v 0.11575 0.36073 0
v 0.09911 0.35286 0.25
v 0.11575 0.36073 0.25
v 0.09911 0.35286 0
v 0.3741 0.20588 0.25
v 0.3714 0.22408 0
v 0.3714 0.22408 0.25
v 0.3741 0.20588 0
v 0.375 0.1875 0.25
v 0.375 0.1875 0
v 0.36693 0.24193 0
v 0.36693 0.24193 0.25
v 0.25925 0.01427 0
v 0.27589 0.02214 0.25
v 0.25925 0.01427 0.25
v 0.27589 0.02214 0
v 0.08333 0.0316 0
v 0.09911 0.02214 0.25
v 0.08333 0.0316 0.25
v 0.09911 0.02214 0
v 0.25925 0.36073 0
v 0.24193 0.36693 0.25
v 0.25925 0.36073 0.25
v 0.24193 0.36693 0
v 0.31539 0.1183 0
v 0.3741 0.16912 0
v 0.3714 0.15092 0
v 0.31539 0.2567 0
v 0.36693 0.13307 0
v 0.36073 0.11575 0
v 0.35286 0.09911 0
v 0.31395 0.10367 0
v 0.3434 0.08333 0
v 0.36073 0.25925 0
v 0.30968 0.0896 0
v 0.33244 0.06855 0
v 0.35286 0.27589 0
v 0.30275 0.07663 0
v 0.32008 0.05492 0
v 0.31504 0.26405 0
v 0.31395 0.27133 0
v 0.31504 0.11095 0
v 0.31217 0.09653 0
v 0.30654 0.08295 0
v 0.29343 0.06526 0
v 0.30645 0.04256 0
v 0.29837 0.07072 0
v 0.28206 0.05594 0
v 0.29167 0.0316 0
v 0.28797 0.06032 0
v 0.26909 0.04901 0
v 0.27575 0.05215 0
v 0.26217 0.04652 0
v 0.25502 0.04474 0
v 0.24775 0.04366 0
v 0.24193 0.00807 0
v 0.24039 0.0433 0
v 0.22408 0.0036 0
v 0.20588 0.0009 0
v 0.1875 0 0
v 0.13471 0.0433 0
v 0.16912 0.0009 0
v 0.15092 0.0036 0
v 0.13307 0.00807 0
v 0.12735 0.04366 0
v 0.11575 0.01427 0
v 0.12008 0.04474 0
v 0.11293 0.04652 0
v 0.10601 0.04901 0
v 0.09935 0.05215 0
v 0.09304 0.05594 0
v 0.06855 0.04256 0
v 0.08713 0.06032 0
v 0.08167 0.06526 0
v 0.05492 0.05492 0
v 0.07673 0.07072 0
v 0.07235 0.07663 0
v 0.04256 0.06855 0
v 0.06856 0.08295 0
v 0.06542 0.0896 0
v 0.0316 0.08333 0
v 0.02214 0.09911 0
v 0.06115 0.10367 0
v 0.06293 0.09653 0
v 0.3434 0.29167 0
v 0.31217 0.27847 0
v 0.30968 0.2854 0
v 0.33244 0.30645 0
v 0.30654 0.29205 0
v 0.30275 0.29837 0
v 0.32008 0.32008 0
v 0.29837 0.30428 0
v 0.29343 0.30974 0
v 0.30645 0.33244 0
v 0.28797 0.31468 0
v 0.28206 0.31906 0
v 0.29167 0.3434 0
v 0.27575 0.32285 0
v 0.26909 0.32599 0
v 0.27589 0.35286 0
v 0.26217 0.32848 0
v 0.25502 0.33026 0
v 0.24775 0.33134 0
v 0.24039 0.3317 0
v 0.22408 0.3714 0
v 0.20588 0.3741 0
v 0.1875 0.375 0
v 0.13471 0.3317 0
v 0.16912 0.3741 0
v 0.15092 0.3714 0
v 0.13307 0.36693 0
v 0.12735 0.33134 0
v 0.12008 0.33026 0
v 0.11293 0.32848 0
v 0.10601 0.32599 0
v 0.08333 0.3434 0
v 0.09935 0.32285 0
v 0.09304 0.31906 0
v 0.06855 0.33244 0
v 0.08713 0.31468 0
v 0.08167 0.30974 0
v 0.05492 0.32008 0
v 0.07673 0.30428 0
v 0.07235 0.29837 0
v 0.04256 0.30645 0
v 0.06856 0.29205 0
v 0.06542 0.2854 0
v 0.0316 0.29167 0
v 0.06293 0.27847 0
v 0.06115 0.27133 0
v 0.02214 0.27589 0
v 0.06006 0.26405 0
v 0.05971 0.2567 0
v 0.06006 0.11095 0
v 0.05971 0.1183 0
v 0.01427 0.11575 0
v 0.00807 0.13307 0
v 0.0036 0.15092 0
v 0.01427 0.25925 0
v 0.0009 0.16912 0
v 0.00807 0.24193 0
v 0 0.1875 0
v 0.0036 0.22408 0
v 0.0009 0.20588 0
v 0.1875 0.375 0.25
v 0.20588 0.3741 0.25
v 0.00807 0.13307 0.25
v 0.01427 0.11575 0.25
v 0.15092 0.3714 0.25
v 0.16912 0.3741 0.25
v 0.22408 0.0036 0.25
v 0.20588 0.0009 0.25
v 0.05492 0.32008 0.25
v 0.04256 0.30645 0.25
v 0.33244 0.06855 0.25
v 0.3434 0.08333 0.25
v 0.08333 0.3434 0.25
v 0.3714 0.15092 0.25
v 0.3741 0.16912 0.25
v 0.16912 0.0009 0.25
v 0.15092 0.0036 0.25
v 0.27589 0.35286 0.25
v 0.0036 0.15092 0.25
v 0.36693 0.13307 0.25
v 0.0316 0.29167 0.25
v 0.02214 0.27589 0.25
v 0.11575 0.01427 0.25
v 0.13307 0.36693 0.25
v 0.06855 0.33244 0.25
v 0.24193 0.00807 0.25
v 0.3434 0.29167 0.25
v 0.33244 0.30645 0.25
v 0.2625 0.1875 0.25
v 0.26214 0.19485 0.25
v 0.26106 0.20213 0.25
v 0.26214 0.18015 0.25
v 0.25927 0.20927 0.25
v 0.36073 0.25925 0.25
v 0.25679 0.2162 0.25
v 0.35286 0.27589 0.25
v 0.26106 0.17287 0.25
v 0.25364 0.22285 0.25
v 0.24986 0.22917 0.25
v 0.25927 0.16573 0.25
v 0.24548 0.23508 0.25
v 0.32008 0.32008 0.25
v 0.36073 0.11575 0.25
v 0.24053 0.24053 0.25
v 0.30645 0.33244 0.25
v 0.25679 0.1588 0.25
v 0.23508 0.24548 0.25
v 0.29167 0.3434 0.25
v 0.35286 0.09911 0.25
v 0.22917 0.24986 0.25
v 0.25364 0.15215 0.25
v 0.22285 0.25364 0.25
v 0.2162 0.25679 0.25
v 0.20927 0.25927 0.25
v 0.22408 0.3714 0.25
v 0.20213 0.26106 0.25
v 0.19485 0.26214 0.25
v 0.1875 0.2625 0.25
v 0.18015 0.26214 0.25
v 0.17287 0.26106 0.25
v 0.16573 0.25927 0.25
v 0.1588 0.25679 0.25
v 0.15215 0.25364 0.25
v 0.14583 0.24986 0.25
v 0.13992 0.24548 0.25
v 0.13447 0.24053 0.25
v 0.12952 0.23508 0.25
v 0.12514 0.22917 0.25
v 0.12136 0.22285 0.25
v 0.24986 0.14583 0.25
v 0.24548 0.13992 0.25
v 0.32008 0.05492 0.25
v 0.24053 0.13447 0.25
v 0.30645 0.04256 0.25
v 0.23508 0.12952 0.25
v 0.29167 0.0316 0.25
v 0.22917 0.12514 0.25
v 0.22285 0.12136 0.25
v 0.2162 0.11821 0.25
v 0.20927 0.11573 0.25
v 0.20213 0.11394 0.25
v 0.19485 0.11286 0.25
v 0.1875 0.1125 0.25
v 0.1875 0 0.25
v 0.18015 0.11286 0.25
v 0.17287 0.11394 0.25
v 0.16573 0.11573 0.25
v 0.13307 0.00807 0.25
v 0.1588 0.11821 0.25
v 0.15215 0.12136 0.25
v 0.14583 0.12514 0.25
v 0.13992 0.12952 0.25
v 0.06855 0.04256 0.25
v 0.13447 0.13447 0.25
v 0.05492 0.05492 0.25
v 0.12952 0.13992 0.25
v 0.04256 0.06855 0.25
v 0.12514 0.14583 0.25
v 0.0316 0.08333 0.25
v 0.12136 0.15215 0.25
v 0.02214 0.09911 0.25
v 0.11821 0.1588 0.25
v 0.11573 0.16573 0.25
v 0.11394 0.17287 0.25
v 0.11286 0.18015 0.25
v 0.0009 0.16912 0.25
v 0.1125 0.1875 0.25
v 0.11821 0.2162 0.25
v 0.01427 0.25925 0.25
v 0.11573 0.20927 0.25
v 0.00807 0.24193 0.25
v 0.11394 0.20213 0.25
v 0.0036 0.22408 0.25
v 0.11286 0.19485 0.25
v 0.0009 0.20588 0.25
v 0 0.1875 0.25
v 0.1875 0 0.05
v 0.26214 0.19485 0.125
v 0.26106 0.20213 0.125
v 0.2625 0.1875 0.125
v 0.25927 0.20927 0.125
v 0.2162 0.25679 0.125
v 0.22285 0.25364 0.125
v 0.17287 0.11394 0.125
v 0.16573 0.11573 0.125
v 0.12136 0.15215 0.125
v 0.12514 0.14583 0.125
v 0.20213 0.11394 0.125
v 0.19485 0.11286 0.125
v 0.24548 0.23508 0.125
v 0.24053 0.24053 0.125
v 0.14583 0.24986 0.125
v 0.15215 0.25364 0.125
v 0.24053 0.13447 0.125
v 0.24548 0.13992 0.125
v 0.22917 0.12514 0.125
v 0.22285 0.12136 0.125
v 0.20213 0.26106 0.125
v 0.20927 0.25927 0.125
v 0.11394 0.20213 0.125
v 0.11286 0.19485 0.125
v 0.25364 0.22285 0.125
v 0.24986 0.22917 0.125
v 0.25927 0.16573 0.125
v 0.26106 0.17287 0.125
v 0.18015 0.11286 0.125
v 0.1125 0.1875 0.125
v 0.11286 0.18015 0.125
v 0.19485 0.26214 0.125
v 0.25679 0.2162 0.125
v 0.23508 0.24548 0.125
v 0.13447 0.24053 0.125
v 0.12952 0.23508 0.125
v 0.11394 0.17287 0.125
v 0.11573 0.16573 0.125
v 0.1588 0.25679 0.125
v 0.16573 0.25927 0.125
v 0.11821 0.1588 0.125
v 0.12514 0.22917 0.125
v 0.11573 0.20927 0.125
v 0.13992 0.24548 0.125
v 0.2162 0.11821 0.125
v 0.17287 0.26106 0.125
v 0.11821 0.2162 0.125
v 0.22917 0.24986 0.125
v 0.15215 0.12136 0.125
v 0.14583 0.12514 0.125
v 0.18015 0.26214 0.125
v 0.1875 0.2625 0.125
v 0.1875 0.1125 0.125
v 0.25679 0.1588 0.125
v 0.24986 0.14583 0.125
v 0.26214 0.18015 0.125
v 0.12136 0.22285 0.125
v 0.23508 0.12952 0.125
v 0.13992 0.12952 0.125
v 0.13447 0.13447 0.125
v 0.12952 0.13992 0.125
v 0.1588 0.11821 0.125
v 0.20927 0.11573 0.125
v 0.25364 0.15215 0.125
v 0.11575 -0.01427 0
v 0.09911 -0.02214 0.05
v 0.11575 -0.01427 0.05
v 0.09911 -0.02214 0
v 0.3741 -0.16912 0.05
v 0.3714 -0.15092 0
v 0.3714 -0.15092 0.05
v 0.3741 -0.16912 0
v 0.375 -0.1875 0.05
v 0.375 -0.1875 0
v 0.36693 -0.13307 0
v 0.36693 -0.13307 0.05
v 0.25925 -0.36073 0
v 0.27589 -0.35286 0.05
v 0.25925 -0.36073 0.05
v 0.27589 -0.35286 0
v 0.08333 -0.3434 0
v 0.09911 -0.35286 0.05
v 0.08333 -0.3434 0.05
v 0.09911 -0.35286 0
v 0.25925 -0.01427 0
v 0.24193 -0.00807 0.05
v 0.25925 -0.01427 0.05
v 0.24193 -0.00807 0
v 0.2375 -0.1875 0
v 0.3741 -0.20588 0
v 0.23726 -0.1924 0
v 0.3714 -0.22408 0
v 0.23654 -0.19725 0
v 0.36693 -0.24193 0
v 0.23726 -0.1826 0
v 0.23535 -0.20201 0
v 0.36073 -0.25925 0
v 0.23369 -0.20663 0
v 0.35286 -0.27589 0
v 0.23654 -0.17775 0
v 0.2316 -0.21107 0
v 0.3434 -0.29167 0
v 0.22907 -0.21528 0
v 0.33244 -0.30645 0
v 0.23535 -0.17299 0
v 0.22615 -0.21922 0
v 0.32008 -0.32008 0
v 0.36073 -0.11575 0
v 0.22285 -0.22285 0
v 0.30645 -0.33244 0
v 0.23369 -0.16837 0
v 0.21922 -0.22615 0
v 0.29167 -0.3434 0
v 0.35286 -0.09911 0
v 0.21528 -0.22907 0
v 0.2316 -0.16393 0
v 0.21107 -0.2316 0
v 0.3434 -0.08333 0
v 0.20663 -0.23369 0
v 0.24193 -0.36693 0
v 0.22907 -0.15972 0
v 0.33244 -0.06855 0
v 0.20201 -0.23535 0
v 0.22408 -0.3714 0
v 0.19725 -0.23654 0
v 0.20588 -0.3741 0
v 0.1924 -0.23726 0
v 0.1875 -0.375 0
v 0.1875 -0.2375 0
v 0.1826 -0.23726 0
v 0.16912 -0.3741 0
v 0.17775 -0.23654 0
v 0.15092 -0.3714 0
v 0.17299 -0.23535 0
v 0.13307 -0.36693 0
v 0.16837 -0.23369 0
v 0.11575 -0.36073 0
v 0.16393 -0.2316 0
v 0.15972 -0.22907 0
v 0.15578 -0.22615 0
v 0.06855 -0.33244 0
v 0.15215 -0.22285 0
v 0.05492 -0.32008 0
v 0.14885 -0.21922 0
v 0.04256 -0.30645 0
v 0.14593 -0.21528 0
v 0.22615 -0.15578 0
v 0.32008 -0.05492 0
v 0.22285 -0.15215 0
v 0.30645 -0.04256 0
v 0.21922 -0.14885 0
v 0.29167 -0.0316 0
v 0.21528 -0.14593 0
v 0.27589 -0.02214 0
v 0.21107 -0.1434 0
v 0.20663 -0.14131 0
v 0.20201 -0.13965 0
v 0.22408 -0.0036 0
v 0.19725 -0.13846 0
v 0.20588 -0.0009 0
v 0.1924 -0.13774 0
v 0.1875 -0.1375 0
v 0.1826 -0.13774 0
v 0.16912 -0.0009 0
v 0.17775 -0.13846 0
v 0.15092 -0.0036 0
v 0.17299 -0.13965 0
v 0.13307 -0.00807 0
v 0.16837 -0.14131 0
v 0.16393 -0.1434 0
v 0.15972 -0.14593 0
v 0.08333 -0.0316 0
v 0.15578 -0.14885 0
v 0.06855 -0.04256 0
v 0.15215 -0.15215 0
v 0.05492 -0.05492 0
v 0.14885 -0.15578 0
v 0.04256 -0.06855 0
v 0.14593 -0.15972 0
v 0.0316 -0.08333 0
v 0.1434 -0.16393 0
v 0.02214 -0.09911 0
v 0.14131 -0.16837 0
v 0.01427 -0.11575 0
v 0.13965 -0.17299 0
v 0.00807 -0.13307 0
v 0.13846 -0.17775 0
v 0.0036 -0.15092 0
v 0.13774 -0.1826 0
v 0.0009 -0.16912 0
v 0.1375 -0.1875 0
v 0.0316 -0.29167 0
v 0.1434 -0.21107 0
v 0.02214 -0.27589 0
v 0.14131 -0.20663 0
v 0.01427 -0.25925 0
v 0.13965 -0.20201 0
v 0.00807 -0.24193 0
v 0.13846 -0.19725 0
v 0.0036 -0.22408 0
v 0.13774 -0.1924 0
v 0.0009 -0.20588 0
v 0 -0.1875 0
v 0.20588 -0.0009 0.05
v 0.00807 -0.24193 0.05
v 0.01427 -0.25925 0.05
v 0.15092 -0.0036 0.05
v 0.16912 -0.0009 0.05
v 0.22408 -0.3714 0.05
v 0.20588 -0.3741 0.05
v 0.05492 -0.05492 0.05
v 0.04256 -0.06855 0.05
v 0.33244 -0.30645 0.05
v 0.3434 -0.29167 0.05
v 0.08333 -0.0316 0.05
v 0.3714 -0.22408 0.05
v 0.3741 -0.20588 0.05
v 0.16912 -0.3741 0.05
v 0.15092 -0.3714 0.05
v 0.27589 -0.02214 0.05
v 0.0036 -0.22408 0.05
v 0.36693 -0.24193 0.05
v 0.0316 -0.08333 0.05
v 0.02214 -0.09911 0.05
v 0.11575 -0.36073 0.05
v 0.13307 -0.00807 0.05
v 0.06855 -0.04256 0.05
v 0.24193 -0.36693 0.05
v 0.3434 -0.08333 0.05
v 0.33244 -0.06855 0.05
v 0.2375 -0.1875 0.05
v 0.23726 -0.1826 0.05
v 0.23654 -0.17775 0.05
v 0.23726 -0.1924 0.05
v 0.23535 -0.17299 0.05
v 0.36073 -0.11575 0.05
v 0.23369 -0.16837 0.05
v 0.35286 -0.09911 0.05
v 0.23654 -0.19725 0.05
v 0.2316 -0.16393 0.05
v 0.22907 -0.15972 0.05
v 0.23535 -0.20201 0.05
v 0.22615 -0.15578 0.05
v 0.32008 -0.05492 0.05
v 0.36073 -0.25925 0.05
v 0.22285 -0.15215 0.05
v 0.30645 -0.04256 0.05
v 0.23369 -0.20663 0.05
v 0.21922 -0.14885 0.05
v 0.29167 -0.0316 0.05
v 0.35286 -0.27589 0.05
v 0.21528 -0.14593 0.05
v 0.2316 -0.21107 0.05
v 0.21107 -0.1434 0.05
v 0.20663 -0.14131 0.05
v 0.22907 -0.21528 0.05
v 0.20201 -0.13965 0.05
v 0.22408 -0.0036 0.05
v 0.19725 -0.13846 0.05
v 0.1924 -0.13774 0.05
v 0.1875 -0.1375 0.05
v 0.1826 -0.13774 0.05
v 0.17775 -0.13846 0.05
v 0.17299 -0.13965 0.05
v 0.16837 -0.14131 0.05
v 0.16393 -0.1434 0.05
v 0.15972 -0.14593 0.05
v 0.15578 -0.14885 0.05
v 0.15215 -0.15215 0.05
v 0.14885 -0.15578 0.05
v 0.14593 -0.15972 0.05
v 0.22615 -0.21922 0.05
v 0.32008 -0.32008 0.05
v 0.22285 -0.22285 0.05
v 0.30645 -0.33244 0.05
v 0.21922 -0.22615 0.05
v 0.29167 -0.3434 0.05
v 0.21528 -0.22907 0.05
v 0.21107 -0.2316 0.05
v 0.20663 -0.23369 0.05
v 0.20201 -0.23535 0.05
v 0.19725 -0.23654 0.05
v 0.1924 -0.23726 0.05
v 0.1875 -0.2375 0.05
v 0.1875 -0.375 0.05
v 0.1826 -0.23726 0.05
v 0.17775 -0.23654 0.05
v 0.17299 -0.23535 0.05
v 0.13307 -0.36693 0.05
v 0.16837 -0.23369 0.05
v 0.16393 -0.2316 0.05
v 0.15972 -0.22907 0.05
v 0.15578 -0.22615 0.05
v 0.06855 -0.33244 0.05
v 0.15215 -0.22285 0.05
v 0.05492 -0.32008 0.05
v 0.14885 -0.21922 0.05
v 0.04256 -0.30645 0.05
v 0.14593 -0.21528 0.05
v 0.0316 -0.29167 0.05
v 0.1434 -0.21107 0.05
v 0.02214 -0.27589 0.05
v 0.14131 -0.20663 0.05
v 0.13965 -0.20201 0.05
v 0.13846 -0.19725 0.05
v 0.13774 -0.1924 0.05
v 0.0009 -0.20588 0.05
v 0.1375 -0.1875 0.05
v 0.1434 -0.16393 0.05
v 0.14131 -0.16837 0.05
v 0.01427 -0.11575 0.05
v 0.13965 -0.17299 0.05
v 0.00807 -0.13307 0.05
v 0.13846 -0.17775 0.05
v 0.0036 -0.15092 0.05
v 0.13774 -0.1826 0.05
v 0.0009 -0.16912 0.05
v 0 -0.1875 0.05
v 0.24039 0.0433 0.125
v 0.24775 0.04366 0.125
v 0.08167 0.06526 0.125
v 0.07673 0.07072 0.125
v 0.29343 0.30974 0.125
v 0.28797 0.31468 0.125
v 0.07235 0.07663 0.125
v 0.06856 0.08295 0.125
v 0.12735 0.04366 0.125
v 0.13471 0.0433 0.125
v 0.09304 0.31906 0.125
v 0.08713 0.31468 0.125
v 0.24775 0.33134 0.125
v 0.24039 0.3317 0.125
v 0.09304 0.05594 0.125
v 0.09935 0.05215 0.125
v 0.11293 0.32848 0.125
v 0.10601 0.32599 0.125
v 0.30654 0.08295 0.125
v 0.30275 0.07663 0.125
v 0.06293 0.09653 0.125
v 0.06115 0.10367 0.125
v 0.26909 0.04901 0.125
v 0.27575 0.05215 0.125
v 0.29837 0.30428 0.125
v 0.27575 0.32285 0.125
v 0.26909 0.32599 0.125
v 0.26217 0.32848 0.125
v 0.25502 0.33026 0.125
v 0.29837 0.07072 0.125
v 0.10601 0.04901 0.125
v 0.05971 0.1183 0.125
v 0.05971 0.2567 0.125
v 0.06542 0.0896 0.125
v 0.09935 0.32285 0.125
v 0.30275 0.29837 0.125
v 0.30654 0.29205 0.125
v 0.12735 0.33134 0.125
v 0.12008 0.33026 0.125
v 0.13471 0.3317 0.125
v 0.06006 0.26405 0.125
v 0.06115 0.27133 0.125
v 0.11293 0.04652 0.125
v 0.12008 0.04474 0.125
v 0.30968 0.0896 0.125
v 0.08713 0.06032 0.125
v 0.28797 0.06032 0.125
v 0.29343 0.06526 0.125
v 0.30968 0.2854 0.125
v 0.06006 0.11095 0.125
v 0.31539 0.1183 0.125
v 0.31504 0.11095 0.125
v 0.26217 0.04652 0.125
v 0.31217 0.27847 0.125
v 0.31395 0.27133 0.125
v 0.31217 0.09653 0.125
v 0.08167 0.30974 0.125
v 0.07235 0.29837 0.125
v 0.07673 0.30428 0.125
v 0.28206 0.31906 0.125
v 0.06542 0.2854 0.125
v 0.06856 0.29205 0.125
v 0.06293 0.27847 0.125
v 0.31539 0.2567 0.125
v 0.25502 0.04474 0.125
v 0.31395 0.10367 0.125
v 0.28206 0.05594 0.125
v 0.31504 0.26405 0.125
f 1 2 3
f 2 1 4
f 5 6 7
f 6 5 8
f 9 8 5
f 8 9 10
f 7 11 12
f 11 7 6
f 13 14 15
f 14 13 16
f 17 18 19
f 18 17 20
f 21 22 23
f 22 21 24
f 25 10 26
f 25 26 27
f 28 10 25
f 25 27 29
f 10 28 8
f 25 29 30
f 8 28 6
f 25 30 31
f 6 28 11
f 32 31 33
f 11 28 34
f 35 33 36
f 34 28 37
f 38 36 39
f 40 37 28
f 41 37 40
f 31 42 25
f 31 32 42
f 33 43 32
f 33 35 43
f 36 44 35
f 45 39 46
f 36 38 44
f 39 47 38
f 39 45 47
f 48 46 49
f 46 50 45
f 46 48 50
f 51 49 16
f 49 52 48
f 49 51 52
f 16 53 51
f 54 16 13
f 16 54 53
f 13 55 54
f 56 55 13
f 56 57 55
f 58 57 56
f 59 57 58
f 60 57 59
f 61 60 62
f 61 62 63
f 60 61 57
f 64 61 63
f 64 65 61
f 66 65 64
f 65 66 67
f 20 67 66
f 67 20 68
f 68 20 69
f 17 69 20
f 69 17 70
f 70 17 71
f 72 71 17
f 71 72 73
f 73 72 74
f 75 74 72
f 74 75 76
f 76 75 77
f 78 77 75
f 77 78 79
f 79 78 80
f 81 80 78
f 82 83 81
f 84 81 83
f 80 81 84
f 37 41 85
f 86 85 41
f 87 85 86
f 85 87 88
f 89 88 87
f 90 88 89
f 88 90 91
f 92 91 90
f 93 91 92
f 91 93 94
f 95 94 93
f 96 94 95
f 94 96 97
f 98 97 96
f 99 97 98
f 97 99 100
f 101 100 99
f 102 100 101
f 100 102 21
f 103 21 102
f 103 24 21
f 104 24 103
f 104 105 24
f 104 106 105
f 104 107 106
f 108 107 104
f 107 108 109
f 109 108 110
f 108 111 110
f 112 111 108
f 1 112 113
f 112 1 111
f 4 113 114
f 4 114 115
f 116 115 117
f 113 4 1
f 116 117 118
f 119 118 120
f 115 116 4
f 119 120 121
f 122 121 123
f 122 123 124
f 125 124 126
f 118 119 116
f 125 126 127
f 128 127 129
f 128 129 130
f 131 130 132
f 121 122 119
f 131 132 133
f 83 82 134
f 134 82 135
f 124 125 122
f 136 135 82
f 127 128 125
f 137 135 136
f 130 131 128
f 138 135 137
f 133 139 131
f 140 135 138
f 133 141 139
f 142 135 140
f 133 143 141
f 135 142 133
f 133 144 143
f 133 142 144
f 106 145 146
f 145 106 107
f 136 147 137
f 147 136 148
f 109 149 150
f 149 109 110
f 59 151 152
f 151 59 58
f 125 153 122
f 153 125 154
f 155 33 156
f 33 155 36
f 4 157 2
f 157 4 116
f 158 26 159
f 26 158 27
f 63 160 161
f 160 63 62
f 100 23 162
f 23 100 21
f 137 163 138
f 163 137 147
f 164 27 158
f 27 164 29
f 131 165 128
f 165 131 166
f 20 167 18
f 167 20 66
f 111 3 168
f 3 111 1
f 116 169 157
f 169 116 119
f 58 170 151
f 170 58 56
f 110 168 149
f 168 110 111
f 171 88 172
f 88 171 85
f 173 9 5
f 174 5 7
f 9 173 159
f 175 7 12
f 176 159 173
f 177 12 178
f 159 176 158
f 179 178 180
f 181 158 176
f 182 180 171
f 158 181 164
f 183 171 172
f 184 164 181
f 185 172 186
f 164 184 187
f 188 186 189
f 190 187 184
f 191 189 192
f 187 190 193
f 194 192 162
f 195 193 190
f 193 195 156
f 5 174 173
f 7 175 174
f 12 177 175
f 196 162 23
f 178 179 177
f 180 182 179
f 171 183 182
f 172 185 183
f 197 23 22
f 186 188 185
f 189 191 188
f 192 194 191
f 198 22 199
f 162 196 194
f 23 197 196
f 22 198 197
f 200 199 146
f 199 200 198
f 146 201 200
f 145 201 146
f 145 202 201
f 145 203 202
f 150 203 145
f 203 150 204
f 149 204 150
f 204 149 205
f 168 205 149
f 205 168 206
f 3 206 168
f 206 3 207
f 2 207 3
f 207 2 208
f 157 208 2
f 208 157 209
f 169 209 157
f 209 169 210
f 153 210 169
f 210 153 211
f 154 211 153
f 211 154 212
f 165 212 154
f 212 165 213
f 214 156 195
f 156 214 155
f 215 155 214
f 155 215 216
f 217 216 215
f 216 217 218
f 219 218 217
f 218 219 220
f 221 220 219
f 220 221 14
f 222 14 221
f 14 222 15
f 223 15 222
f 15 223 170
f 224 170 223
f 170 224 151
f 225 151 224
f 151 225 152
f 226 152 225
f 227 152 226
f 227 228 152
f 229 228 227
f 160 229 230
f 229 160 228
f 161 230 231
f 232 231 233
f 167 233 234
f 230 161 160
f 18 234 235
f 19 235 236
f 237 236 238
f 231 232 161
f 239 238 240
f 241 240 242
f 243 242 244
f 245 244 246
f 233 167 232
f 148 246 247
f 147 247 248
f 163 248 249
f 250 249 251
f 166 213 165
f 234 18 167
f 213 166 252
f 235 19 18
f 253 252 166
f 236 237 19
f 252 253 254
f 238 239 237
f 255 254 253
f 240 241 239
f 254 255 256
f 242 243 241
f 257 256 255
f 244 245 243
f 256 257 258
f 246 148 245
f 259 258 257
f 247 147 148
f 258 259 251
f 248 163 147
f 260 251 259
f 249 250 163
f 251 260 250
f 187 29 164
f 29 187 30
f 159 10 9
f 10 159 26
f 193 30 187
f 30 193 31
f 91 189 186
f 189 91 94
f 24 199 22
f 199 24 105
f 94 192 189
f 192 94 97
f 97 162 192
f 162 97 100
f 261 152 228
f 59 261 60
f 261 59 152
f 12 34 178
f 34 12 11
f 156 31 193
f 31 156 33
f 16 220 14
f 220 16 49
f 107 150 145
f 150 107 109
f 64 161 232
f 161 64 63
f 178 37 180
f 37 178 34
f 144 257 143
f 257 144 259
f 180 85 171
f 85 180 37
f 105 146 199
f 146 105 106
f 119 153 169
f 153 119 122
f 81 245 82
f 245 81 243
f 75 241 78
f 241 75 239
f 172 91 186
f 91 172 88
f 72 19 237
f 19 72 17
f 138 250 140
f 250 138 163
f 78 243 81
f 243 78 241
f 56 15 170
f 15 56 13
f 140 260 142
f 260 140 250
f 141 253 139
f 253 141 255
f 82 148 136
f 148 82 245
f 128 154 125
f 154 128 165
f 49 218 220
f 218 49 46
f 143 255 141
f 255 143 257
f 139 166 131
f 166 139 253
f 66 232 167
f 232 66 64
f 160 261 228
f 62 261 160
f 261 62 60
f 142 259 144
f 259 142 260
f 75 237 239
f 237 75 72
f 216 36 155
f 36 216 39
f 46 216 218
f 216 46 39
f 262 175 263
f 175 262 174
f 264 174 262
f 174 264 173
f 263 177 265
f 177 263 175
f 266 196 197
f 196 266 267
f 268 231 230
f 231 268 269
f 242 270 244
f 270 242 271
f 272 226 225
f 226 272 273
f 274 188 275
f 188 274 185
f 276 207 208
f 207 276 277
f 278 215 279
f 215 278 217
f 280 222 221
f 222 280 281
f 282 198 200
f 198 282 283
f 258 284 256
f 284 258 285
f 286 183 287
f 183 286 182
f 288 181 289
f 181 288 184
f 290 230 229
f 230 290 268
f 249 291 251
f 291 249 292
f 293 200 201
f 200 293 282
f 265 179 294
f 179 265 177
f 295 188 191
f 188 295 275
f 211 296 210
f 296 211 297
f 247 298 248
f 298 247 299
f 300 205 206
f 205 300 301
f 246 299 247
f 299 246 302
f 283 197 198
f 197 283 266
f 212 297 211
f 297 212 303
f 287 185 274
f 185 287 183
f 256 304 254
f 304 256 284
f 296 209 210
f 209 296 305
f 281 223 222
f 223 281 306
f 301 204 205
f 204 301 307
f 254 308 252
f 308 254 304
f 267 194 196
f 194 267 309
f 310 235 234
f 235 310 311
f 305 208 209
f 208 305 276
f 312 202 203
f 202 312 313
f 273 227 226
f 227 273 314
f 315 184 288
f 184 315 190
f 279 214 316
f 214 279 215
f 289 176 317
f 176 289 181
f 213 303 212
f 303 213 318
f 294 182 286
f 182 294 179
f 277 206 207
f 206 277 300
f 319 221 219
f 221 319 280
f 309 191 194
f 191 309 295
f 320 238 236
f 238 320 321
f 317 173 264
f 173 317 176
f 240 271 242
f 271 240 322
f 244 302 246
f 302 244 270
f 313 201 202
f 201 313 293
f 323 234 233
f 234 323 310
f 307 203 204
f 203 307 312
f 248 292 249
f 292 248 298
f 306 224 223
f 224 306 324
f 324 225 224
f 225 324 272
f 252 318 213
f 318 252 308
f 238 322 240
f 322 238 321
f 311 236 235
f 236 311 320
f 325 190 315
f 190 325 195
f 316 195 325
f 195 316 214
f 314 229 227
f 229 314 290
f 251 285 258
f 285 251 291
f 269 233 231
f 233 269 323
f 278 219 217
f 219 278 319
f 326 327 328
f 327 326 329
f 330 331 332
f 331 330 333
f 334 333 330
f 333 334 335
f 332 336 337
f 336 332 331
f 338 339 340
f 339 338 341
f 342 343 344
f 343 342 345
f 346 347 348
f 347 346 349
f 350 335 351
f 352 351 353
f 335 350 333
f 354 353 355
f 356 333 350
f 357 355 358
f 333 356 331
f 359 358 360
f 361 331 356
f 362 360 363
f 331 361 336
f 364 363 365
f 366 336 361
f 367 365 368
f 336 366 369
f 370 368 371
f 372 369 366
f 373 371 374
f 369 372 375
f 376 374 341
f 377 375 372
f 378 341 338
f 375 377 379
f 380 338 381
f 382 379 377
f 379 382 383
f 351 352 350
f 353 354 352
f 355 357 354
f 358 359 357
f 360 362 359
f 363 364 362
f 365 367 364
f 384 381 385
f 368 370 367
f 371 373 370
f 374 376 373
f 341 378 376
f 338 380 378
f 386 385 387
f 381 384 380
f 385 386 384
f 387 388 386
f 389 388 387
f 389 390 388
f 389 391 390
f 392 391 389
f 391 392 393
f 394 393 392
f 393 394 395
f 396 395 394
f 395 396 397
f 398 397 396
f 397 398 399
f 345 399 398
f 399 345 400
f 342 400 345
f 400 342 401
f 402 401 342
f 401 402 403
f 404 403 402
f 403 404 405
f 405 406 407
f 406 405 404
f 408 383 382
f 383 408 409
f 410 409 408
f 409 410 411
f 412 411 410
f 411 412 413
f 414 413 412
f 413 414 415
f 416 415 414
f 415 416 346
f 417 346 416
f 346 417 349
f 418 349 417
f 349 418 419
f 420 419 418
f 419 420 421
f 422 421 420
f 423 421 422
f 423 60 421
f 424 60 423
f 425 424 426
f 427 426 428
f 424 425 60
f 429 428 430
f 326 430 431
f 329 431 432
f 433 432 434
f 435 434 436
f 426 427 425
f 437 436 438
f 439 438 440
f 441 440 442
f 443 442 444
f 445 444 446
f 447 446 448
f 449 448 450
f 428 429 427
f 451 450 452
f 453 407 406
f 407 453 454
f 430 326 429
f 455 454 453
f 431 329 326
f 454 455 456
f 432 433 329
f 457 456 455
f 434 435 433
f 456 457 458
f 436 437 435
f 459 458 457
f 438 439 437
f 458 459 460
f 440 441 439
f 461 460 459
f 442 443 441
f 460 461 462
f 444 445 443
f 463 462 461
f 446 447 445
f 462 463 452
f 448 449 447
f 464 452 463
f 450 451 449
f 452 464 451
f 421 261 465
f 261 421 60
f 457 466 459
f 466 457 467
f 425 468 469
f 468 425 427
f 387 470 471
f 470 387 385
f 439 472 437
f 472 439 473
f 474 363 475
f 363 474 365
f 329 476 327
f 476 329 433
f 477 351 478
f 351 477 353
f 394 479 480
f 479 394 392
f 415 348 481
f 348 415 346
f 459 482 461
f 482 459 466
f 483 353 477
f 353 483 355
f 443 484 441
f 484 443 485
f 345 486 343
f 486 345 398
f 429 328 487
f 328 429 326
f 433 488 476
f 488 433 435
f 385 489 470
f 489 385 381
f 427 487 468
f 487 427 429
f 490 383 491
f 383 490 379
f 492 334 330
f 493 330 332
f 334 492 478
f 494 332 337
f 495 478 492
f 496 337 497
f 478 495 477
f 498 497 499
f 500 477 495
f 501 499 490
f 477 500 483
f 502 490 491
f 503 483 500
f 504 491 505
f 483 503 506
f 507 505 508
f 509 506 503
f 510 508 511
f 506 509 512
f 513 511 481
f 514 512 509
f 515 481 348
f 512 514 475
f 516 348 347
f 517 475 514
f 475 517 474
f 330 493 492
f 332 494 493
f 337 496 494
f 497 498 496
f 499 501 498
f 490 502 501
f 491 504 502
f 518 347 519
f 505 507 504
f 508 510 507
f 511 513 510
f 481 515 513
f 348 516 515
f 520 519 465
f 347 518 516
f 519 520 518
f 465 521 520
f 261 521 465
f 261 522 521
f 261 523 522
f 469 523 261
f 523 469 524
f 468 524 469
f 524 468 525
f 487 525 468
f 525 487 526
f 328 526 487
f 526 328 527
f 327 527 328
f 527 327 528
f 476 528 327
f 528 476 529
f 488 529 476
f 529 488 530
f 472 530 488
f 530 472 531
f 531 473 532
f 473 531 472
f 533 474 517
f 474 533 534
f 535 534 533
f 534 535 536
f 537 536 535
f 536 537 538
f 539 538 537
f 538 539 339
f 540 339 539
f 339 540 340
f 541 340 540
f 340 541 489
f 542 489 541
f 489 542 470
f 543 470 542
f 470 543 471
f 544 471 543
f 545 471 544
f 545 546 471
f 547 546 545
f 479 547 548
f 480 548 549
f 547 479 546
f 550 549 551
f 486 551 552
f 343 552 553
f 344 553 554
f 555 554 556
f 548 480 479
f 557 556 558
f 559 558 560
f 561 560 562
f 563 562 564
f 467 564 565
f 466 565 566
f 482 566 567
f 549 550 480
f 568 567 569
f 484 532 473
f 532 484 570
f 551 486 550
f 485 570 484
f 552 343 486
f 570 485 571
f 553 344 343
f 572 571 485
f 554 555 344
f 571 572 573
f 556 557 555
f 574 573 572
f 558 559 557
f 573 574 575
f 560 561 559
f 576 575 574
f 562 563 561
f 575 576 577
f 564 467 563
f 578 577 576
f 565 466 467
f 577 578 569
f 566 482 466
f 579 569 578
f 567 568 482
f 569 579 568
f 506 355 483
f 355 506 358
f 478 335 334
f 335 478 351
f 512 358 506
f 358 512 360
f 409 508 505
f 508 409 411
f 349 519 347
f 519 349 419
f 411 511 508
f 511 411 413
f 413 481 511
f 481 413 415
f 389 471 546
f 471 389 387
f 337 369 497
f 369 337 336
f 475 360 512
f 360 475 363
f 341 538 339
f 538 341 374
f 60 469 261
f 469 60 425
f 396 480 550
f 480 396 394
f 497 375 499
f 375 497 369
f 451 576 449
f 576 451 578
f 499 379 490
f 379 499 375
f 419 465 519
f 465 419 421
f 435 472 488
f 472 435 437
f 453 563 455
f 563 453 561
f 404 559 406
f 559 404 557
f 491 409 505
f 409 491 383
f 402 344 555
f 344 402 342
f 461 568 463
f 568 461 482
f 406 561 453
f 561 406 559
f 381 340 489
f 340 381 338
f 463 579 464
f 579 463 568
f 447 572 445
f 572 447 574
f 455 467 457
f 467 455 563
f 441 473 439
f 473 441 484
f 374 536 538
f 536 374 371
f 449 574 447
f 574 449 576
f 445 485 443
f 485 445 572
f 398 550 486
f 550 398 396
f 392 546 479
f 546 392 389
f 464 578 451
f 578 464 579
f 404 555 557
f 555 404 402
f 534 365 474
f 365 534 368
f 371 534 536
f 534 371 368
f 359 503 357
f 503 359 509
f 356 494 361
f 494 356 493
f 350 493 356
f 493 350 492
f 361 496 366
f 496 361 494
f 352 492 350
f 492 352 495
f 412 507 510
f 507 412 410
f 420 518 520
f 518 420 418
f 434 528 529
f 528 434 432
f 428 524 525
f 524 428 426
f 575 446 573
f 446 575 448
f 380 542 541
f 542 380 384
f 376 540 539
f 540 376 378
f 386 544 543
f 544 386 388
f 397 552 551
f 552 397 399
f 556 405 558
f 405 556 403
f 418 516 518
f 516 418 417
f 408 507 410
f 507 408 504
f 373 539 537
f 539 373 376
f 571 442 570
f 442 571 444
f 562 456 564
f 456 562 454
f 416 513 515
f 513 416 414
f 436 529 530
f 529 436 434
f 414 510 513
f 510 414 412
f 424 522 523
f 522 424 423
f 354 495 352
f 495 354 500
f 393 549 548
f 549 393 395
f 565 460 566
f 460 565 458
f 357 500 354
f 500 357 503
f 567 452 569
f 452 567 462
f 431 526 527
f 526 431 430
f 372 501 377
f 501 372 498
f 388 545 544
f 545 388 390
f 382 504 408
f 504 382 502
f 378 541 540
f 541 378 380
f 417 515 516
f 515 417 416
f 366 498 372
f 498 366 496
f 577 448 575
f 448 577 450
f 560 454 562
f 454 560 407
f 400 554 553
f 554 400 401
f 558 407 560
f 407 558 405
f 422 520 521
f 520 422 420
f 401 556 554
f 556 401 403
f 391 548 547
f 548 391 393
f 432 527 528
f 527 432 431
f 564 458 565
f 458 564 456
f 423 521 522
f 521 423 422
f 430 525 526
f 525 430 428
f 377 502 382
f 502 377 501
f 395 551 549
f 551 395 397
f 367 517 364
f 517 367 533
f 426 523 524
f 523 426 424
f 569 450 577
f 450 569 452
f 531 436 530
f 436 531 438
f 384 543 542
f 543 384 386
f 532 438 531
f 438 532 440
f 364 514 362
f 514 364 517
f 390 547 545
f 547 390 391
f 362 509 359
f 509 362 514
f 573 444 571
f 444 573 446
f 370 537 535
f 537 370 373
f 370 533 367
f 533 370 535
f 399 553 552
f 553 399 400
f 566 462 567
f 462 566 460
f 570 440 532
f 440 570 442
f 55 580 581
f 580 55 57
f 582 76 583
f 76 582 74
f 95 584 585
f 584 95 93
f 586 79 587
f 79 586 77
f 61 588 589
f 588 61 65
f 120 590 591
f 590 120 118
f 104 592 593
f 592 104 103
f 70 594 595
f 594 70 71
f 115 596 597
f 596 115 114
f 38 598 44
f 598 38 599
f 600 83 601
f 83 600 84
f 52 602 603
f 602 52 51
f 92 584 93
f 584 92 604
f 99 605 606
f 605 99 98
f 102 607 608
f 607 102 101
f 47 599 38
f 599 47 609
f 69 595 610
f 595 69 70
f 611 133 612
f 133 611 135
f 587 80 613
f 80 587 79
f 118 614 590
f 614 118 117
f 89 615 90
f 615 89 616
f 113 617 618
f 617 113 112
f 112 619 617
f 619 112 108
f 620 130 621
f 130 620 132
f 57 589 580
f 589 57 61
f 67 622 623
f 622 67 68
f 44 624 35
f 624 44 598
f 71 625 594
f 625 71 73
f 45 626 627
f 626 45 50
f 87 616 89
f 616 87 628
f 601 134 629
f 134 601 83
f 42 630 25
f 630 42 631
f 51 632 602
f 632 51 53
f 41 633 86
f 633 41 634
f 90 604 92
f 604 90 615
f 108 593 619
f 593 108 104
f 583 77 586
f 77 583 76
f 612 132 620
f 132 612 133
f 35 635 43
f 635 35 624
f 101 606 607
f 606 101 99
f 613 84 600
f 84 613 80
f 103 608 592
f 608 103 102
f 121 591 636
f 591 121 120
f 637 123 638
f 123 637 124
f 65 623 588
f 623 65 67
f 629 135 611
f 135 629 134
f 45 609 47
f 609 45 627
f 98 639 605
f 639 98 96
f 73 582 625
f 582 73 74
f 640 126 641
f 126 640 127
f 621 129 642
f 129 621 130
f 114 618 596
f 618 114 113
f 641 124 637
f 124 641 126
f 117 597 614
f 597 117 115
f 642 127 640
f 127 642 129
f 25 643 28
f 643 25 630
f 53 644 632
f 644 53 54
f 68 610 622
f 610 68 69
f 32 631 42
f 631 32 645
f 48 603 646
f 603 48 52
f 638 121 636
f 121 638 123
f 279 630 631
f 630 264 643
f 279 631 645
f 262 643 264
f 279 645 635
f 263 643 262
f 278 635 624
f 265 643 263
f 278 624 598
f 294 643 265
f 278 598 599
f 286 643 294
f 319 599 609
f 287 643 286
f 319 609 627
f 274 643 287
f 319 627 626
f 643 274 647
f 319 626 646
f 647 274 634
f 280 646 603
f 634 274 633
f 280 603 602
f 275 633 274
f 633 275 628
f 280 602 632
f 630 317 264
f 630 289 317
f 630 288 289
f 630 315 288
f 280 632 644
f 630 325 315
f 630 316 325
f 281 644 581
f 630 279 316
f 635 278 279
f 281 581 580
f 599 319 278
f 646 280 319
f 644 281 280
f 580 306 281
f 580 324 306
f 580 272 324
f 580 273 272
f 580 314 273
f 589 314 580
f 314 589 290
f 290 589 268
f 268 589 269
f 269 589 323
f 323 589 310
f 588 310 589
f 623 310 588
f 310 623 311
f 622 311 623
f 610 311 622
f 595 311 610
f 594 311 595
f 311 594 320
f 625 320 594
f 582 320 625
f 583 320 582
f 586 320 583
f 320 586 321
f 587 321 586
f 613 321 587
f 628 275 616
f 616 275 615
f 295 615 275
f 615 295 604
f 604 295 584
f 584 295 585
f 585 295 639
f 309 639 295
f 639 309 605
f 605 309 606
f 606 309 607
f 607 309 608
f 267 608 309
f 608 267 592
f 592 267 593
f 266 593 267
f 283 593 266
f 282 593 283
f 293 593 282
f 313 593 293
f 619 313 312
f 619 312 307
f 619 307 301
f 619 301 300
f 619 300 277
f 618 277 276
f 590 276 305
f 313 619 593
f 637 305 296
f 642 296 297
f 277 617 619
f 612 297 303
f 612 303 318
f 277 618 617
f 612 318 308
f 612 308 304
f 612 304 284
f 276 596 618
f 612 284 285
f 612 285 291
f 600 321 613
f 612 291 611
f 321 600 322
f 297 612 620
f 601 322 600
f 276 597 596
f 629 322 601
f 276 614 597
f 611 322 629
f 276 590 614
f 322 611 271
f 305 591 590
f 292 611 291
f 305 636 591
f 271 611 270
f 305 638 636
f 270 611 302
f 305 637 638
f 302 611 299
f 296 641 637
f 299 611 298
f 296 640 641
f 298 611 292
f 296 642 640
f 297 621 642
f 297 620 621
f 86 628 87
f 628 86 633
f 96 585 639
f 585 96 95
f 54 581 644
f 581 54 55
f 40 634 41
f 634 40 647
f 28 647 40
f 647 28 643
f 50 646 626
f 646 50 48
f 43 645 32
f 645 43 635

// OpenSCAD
// Parametric dimensions (all linear units in inches)
$fn = 64;               // facet count for circles

// ---------- main annular cylinder (sleeve) ----------
main_outer_r   = 0.1875;    // outer radius
main_bore_r    = 0.075;     // through‑bore radius
main_h         = 0.25;      // height (from underside datum)
main_x         = 0.1875;    // centre X (from left edge)
main_y         = 0.1875;    // centre Y (from front edge)

// ---------- attached shallow annular tab ----------
tab_outer_r    = 0.1875;    // outer radius
tab_bore_r     = 0.05;      // through‑hole radius
tab_h          = 0.05;      // height
tab_x          = 0.1875;    // centre X
tab_y          = -0.1875;   // centre Y (forward of main body)

// ---------- underside recess (rounded‑rectangular pocket) ----------
// overall footprint rectangle (before corner rounding)
recess_w       = 0.2557;    // X dimension
recess_d       = 0.2884;    // Y dimension
// offsets from the 0.375 × 0.375 reference base
recess_l_off   = 0.0597;    // left
recess_r_off   = 0.0596;    // right
recess_f_off   = 0.0433;    // front
recess_b_off   = 0.0433;    // back
recess_cr      = 0.075;     // corner radius (circular cut profile)
recess_h       = 0.125;     // depth from underside (z = 0..0.125)

// derived centre of the recess from the offsets
recess_cx = (0.375 - recess_r_off - recess_l_off) / 2 + recess_l_off; // = 0.1875
recess_cy = (0.375 - recess_b_off - recess_f_off) / 2 + recess_f_off; // = 0.1875

// --- helper module: hollow cylinder (annular ring) ---
module hollow_cylinder(outer_r, inner_r, h, cx, cy) {
    translate([cx, cy, 0])
        difference() {
            cylinder(r = outer_r, h = h);
            cylinder(r = inner_r, h = h + 0.01); // slight overcut avoids coplanar faces
        }
}

// --- main body ---
module main_body() {
    hollow_cylinder(main_outer_r, main_bore_r, main_h, main_x, main_y);
}

// --- shallow tab ---
module tab() {
    hollow_cylinder(tab_outer_r, tab_bore_r, tab_h, tab_x, tab_y);
}

// --- underside recess (rounded rectangle pocket) ---
module recess_cut() {
    linear_extrude(height = recess_h) {
        translate([recess_cx, recess_cy, 0])
            // create a rounded rectangle by expanding a smaller square
            offset(r = recess_cr)
                square(
                    [recess_w - 2 * recess_cr, recess_d - 2 * recess_cr],
                    center = true
                );
    }
}

// --- final solid ---
difference() {
    union() {
        main_body();
        tab();
    }
    recess_cut();   // remove pocket from underside
}
